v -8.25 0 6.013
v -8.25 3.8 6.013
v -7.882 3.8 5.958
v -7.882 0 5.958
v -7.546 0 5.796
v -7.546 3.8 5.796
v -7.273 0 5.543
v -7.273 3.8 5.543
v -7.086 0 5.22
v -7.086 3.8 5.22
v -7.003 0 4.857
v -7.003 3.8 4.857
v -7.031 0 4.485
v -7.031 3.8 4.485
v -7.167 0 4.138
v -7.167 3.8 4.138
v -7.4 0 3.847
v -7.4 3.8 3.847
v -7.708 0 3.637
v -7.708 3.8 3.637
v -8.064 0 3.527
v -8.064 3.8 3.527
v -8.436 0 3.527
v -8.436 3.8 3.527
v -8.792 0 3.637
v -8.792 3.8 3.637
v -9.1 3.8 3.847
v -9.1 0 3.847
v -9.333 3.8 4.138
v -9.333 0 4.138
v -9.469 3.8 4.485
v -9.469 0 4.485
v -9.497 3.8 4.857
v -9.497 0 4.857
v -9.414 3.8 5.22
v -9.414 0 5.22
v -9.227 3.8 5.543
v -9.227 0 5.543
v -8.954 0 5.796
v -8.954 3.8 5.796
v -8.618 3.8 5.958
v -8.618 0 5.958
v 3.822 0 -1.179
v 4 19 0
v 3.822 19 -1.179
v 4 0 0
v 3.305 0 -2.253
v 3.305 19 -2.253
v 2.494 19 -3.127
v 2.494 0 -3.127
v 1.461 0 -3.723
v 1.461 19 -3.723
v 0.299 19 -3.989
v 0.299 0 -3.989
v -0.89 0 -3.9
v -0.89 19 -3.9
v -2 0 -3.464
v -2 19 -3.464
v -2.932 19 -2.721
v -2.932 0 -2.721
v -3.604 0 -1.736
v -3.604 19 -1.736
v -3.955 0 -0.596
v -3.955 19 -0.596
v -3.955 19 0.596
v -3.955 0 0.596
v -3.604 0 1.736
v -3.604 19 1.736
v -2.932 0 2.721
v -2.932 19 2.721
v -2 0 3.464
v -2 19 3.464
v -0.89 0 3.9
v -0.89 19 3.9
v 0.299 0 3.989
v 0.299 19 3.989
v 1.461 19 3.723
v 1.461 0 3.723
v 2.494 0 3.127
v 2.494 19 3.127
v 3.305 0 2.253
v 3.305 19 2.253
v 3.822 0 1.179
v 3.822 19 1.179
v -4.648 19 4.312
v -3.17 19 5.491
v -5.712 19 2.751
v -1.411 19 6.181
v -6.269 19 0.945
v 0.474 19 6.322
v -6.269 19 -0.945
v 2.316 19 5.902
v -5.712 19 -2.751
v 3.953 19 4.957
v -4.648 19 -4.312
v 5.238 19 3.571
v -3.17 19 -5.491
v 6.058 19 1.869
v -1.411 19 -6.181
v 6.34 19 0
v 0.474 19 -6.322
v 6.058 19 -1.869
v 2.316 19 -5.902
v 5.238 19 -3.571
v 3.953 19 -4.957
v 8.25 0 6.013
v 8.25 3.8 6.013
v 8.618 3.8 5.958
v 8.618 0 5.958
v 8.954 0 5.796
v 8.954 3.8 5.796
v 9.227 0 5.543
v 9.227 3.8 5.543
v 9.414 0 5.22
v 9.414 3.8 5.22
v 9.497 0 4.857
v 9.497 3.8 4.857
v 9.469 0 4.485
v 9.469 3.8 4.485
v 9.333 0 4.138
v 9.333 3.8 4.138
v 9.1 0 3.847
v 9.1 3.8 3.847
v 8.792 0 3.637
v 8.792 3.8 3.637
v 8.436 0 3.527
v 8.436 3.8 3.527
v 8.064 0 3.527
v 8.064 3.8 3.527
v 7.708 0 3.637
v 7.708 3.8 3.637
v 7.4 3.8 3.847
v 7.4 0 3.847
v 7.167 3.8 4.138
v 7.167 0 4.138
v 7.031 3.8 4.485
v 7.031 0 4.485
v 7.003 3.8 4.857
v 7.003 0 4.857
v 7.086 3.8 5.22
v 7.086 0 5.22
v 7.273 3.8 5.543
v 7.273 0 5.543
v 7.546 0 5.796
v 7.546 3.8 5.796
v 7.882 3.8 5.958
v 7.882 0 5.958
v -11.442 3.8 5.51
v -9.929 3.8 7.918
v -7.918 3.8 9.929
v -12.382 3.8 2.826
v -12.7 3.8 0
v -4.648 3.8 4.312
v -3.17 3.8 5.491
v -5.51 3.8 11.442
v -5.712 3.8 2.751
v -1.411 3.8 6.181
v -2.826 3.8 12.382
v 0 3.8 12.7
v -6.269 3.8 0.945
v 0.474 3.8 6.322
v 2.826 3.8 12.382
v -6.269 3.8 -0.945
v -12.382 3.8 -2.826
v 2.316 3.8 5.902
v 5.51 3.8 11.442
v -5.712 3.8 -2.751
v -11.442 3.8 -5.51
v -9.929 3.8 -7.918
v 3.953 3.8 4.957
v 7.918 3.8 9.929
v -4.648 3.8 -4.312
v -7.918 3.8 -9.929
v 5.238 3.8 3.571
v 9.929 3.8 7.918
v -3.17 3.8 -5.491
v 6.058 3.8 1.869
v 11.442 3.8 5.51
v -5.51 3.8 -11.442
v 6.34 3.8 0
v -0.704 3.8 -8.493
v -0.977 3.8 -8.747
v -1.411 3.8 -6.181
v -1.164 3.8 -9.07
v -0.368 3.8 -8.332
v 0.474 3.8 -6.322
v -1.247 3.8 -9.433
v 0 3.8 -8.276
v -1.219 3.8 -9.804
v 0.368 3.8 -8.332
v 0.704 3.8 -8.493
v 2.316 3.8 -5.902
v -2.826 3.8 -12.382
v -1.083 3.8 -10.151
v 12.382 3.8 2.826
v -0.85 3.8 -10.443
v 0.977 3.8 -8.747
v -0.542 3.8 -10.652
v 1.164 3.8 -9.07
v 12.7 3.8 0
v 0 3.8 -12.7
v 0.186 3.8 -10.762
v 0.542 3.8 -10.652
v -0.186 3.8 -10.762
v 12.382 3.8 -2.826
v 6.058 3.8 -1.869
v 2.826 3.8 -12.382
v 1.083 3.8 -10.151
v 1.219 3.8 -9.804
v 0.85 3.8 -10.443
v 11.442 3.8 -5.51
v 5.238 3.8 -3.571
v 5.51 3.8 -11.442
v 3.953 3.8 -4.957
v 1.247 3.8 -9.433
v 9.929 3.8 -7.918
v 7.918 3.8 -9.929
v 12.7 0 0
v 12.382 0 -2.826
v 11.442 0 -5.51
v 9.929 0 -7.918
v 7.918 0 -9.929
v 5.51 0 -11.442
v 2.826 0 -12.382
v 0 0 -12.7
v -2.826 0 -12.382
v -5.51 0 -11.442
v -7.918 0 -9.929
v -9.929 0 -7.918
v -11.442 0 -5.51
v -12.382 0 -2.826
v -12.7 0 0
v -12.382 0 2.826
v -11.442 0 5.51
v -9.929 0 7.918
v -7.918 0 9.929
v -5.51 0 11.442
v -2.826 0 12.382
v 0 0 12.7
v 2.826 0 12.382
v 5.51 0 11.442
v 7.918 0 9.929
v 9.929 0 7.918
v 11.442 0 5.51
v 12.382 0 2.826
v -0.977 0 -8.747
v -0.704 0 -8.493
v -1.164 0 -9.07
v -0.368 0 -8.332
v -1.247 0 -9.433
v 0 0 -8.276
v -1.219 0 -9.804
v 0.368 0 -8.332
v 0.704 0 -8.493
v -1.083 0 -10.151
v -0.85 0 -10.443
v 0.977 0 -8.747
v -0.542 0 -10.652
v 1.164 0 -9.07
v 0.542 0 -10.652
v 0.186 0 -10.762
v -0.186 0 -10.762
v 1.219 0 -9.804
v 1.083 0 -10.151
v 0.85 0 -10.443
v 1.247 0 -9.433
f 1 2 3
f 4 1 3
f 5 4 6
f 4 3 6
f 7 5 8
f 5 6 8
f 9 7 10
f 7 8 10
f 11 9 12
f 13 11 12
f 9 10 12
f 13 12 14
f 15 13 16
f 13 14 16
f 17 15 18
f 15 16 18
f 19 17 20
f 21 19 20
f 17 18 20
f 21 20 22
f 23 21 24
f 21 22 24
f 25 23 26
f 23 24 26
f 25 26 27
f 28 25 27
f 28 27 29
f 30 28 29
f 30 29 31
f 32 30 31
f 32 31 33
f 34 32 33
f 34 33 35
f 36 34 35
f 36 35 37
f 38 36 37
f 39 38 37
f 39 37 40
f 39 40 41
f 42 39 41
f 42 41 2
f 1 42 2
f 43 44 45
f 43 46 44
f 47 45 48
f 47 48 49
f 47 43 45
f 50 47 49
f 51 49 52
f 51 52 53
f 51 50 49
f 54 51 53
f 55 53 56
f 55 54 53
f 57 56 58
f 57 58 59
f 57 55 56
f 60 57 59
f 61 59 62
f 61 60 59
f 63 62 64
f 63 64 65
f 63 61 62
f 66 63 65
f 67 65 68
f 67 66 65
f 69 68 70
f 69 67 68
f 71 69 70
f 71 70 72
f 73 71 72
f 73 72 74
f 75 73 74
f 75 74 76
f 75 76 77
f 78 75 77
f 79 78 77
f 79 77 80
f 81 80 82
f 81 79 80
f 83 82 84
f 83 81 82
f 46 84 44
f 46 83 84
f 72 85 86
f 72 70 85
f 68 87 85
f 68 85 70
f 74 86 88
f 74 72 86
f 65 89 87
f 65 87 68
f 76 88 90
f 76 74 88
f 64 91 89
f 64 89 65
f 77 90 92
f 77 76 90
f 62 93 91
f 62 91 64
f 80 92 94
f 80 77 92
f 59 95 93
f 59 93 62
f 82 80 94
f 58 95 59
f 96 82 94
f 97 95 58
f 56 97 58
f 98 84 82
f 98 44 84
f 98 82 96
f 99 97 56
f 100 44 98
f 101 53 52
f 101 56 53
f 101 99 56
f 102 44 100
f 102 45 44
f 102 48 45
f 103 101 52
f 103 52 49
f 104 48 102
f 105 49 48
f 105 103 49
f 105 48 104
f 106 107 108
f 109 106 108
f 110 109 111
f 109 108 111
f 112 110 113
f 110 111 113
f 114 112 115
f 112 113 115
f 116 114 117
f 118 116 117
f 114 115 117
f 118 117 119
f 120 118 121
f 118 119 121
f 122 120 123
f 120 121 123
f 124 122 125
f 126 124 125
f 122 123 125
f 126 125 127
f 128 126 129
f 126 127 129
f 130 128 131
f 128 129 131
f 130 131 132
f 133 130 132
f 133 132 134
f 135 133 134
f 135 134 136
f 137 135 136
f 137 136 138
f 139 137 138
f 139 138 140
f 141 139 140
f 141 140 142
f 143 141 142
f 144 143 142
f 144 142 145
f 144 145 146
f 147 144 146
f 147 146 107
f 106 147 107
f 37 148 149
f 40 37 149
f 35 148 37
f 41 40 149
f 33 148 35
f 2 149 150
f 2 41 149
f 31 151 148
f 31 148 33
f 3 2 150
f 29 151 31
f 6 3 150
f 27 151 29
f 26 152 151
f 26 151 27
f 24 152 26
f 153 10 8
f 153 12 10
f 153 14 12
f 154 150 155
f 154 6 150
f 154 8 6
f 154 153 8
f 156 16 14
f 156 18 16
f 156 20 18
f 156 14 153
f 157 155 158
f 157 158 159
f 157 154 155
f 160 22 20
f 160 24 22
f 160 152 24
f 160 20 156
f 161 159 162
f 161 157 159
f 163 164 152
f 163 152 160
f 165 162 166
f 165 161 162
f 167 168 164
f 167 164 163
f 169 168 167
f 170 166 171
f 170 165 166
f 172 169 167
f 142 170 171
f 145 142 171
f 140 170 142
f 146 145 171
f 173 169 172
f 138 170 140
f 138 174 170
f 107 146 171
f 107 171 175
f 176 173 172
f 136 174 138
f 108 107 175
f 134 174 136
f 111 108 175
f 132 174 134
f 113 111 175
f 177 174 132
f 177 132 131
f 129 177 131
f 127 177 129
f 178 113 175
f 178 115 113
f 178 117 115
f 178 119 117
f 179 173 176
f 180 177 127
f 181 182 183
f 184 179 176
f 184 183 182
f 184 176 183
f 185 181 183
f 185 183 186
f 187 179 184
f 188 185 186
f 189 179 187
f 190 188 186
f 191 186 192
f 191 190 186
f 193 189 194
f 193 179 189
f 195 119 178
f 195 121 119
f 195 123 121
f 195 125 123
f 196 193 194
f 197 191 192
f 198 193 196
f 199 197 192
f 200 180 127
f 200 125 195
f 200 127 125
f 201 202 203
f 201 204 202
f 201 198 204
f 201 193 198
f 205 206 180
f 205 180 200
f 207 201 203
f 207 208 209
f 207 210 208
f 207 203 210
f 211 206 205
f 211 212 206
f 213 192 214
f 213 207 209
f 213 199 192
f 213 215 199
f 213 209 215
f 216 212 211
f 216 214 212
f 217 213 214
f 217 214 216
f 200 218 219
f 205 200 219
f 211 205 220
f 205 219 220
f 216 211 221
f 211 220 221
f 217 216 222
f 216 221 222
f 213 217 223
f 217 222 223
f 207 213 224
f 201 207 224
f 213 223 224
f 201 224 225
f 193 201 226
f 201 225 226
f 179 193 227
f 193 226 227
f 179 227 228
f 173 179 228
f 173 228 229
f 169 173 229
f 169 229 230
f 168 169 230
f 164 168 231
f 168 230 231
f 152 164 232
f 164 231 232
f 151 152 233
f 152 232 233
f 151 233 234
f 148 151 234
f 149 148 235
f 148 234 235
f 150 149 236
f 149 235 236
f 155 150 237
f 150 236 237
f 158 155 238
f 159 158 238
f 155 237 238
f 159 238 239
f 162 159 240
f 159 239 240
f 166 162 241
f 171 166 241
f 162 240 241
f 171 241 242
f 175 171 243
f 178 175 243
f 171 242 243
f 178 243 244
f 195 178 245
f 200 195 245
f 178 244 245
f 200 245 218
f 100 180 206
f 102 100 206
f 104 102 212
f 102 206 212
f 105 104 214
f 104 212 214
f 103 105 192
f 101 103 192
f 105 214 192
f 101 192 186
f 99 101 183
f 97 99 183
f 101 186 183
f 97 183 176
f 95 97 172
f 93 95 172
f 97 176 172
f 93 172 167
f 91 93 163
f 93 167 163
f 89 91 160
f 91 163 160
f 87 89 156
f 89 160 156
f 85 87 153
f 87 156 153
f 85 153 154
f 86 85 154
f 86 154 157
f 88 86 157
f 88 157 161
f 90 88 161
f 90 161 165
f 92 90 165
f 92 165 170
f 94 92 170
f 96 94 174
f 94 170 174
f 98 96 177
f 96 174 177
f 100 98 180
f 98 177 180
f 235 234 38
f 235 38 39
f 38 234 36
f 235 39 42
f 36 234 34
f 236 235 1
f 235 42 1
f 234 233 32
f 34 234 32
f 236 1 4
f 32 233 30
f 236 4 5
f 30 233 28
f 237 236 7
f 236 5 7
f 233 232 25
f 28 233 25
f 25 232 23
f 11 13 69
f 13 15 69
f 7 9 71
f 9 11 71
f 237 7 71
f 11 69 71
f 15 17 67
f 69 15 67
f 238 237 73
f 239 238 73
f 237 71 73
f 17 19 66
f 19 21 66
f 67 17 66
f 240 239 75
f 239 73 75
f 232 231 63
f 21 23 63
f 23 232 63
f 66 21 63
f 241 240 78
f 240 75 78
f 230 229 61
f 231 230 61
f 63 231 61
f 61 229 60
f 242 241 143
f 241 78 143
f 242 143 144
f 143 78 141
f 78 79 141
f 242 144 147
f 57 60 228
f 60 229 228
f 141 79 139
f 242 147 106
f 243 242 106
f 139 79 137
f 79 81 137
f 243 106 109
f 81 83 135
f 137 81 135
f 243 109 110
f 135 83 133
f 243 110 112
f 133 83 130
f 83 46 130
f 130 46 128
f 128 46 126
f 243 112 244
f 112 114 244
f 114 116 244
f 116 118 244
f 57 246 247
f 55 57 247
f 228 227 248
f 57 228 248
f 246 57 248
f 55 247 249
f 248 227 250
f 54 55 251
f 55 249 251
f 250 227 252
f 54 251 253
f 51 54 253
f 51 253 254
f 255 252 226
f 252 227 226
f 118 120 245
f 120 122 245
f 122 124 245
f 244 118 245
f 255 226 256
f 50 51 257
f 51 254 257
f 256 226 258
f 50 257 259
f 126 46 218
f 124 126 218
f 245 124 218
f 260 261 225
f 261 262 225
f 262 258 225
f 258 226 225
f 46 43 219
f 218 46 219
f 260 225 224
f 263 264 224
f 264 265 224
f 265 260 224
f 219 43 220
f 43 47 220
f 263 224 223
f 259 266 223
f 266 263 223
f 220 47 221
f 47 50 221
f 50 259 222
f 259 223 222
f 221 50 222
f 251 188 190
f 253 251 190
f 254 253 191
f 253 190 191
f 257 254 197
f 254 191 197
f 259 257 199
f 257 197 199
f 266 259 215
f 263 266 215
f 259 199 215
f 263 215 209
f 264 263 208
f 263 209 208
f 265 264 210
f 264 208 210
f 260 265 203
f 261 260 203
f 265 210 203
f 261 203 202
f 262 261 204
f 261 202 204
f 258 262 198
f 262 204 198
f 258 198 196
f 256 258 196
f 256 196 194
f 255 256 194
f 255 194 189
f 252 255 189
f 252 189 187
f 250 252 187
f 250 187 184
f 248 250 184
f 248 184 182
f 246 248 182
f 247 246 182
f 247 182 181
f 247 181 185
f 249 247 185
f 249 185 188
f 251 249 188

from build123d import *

# Parameters (mm, degrees)
SKETCH1_R                   = 12.7
SKETCH1_R_2                 = 4
BOSS_EXTRUDE1_DEPTH         = 3.8
SKETCH2_R                   = 6.34
SKETCH2_R_2                 = 4
BOSS_EXTRUDE2_DEPTH         = 15.2
TAP_DRILL_FOR_M3_TAP1_D     = 2.5
TAP_DRILL_FOR_M3_TAP1_DEPTH = 3.8


with BuildPart() as part:
    # Sketch1 → Boss-Extrude1 (new body)
    with BuildSketch(Plane(origin=(0, 0, 0), x_dir=(1, 0, 0), z_dir=(0, 1, 0))):
        Circle(SKETCH1_R)
        Circle(SKETCH1_R_2, mode=Mode.SUBTRACT)
    extrude(amount=BOSS_EXTRUDE1_DEPTH)

    # Sketch2 → Boss-Extrude2 (add)
    with BuildSketch(Plane(origin=(0, 3.8, 0), x_dir=(1, 0, 0), z_dir=(0, 1, 0))):
        Circle(SKETCH2_R)
        Circle(SKETCH2_R_2, mode=Mode.SUBTRACT)
    extrude(amount=BOSS_EXTRUDE2_DEPTH)

    # Tap Drill for M3 Tap1
    with Locations(Plane(origin=(-8.25, 0, 4.763139721), x_dir=(0, 0, -1), z_dir=(0, -1, 0))):
        with Locations((0, 0), (0, 16.5), (14.289419163, 8.25)):
            Hole(TAP_DRILL_FOR_M3_TAP1_D / 2, depth=TAP_DRILL_FOR_M3_TAP1_DEPTH)


solid = part.part
